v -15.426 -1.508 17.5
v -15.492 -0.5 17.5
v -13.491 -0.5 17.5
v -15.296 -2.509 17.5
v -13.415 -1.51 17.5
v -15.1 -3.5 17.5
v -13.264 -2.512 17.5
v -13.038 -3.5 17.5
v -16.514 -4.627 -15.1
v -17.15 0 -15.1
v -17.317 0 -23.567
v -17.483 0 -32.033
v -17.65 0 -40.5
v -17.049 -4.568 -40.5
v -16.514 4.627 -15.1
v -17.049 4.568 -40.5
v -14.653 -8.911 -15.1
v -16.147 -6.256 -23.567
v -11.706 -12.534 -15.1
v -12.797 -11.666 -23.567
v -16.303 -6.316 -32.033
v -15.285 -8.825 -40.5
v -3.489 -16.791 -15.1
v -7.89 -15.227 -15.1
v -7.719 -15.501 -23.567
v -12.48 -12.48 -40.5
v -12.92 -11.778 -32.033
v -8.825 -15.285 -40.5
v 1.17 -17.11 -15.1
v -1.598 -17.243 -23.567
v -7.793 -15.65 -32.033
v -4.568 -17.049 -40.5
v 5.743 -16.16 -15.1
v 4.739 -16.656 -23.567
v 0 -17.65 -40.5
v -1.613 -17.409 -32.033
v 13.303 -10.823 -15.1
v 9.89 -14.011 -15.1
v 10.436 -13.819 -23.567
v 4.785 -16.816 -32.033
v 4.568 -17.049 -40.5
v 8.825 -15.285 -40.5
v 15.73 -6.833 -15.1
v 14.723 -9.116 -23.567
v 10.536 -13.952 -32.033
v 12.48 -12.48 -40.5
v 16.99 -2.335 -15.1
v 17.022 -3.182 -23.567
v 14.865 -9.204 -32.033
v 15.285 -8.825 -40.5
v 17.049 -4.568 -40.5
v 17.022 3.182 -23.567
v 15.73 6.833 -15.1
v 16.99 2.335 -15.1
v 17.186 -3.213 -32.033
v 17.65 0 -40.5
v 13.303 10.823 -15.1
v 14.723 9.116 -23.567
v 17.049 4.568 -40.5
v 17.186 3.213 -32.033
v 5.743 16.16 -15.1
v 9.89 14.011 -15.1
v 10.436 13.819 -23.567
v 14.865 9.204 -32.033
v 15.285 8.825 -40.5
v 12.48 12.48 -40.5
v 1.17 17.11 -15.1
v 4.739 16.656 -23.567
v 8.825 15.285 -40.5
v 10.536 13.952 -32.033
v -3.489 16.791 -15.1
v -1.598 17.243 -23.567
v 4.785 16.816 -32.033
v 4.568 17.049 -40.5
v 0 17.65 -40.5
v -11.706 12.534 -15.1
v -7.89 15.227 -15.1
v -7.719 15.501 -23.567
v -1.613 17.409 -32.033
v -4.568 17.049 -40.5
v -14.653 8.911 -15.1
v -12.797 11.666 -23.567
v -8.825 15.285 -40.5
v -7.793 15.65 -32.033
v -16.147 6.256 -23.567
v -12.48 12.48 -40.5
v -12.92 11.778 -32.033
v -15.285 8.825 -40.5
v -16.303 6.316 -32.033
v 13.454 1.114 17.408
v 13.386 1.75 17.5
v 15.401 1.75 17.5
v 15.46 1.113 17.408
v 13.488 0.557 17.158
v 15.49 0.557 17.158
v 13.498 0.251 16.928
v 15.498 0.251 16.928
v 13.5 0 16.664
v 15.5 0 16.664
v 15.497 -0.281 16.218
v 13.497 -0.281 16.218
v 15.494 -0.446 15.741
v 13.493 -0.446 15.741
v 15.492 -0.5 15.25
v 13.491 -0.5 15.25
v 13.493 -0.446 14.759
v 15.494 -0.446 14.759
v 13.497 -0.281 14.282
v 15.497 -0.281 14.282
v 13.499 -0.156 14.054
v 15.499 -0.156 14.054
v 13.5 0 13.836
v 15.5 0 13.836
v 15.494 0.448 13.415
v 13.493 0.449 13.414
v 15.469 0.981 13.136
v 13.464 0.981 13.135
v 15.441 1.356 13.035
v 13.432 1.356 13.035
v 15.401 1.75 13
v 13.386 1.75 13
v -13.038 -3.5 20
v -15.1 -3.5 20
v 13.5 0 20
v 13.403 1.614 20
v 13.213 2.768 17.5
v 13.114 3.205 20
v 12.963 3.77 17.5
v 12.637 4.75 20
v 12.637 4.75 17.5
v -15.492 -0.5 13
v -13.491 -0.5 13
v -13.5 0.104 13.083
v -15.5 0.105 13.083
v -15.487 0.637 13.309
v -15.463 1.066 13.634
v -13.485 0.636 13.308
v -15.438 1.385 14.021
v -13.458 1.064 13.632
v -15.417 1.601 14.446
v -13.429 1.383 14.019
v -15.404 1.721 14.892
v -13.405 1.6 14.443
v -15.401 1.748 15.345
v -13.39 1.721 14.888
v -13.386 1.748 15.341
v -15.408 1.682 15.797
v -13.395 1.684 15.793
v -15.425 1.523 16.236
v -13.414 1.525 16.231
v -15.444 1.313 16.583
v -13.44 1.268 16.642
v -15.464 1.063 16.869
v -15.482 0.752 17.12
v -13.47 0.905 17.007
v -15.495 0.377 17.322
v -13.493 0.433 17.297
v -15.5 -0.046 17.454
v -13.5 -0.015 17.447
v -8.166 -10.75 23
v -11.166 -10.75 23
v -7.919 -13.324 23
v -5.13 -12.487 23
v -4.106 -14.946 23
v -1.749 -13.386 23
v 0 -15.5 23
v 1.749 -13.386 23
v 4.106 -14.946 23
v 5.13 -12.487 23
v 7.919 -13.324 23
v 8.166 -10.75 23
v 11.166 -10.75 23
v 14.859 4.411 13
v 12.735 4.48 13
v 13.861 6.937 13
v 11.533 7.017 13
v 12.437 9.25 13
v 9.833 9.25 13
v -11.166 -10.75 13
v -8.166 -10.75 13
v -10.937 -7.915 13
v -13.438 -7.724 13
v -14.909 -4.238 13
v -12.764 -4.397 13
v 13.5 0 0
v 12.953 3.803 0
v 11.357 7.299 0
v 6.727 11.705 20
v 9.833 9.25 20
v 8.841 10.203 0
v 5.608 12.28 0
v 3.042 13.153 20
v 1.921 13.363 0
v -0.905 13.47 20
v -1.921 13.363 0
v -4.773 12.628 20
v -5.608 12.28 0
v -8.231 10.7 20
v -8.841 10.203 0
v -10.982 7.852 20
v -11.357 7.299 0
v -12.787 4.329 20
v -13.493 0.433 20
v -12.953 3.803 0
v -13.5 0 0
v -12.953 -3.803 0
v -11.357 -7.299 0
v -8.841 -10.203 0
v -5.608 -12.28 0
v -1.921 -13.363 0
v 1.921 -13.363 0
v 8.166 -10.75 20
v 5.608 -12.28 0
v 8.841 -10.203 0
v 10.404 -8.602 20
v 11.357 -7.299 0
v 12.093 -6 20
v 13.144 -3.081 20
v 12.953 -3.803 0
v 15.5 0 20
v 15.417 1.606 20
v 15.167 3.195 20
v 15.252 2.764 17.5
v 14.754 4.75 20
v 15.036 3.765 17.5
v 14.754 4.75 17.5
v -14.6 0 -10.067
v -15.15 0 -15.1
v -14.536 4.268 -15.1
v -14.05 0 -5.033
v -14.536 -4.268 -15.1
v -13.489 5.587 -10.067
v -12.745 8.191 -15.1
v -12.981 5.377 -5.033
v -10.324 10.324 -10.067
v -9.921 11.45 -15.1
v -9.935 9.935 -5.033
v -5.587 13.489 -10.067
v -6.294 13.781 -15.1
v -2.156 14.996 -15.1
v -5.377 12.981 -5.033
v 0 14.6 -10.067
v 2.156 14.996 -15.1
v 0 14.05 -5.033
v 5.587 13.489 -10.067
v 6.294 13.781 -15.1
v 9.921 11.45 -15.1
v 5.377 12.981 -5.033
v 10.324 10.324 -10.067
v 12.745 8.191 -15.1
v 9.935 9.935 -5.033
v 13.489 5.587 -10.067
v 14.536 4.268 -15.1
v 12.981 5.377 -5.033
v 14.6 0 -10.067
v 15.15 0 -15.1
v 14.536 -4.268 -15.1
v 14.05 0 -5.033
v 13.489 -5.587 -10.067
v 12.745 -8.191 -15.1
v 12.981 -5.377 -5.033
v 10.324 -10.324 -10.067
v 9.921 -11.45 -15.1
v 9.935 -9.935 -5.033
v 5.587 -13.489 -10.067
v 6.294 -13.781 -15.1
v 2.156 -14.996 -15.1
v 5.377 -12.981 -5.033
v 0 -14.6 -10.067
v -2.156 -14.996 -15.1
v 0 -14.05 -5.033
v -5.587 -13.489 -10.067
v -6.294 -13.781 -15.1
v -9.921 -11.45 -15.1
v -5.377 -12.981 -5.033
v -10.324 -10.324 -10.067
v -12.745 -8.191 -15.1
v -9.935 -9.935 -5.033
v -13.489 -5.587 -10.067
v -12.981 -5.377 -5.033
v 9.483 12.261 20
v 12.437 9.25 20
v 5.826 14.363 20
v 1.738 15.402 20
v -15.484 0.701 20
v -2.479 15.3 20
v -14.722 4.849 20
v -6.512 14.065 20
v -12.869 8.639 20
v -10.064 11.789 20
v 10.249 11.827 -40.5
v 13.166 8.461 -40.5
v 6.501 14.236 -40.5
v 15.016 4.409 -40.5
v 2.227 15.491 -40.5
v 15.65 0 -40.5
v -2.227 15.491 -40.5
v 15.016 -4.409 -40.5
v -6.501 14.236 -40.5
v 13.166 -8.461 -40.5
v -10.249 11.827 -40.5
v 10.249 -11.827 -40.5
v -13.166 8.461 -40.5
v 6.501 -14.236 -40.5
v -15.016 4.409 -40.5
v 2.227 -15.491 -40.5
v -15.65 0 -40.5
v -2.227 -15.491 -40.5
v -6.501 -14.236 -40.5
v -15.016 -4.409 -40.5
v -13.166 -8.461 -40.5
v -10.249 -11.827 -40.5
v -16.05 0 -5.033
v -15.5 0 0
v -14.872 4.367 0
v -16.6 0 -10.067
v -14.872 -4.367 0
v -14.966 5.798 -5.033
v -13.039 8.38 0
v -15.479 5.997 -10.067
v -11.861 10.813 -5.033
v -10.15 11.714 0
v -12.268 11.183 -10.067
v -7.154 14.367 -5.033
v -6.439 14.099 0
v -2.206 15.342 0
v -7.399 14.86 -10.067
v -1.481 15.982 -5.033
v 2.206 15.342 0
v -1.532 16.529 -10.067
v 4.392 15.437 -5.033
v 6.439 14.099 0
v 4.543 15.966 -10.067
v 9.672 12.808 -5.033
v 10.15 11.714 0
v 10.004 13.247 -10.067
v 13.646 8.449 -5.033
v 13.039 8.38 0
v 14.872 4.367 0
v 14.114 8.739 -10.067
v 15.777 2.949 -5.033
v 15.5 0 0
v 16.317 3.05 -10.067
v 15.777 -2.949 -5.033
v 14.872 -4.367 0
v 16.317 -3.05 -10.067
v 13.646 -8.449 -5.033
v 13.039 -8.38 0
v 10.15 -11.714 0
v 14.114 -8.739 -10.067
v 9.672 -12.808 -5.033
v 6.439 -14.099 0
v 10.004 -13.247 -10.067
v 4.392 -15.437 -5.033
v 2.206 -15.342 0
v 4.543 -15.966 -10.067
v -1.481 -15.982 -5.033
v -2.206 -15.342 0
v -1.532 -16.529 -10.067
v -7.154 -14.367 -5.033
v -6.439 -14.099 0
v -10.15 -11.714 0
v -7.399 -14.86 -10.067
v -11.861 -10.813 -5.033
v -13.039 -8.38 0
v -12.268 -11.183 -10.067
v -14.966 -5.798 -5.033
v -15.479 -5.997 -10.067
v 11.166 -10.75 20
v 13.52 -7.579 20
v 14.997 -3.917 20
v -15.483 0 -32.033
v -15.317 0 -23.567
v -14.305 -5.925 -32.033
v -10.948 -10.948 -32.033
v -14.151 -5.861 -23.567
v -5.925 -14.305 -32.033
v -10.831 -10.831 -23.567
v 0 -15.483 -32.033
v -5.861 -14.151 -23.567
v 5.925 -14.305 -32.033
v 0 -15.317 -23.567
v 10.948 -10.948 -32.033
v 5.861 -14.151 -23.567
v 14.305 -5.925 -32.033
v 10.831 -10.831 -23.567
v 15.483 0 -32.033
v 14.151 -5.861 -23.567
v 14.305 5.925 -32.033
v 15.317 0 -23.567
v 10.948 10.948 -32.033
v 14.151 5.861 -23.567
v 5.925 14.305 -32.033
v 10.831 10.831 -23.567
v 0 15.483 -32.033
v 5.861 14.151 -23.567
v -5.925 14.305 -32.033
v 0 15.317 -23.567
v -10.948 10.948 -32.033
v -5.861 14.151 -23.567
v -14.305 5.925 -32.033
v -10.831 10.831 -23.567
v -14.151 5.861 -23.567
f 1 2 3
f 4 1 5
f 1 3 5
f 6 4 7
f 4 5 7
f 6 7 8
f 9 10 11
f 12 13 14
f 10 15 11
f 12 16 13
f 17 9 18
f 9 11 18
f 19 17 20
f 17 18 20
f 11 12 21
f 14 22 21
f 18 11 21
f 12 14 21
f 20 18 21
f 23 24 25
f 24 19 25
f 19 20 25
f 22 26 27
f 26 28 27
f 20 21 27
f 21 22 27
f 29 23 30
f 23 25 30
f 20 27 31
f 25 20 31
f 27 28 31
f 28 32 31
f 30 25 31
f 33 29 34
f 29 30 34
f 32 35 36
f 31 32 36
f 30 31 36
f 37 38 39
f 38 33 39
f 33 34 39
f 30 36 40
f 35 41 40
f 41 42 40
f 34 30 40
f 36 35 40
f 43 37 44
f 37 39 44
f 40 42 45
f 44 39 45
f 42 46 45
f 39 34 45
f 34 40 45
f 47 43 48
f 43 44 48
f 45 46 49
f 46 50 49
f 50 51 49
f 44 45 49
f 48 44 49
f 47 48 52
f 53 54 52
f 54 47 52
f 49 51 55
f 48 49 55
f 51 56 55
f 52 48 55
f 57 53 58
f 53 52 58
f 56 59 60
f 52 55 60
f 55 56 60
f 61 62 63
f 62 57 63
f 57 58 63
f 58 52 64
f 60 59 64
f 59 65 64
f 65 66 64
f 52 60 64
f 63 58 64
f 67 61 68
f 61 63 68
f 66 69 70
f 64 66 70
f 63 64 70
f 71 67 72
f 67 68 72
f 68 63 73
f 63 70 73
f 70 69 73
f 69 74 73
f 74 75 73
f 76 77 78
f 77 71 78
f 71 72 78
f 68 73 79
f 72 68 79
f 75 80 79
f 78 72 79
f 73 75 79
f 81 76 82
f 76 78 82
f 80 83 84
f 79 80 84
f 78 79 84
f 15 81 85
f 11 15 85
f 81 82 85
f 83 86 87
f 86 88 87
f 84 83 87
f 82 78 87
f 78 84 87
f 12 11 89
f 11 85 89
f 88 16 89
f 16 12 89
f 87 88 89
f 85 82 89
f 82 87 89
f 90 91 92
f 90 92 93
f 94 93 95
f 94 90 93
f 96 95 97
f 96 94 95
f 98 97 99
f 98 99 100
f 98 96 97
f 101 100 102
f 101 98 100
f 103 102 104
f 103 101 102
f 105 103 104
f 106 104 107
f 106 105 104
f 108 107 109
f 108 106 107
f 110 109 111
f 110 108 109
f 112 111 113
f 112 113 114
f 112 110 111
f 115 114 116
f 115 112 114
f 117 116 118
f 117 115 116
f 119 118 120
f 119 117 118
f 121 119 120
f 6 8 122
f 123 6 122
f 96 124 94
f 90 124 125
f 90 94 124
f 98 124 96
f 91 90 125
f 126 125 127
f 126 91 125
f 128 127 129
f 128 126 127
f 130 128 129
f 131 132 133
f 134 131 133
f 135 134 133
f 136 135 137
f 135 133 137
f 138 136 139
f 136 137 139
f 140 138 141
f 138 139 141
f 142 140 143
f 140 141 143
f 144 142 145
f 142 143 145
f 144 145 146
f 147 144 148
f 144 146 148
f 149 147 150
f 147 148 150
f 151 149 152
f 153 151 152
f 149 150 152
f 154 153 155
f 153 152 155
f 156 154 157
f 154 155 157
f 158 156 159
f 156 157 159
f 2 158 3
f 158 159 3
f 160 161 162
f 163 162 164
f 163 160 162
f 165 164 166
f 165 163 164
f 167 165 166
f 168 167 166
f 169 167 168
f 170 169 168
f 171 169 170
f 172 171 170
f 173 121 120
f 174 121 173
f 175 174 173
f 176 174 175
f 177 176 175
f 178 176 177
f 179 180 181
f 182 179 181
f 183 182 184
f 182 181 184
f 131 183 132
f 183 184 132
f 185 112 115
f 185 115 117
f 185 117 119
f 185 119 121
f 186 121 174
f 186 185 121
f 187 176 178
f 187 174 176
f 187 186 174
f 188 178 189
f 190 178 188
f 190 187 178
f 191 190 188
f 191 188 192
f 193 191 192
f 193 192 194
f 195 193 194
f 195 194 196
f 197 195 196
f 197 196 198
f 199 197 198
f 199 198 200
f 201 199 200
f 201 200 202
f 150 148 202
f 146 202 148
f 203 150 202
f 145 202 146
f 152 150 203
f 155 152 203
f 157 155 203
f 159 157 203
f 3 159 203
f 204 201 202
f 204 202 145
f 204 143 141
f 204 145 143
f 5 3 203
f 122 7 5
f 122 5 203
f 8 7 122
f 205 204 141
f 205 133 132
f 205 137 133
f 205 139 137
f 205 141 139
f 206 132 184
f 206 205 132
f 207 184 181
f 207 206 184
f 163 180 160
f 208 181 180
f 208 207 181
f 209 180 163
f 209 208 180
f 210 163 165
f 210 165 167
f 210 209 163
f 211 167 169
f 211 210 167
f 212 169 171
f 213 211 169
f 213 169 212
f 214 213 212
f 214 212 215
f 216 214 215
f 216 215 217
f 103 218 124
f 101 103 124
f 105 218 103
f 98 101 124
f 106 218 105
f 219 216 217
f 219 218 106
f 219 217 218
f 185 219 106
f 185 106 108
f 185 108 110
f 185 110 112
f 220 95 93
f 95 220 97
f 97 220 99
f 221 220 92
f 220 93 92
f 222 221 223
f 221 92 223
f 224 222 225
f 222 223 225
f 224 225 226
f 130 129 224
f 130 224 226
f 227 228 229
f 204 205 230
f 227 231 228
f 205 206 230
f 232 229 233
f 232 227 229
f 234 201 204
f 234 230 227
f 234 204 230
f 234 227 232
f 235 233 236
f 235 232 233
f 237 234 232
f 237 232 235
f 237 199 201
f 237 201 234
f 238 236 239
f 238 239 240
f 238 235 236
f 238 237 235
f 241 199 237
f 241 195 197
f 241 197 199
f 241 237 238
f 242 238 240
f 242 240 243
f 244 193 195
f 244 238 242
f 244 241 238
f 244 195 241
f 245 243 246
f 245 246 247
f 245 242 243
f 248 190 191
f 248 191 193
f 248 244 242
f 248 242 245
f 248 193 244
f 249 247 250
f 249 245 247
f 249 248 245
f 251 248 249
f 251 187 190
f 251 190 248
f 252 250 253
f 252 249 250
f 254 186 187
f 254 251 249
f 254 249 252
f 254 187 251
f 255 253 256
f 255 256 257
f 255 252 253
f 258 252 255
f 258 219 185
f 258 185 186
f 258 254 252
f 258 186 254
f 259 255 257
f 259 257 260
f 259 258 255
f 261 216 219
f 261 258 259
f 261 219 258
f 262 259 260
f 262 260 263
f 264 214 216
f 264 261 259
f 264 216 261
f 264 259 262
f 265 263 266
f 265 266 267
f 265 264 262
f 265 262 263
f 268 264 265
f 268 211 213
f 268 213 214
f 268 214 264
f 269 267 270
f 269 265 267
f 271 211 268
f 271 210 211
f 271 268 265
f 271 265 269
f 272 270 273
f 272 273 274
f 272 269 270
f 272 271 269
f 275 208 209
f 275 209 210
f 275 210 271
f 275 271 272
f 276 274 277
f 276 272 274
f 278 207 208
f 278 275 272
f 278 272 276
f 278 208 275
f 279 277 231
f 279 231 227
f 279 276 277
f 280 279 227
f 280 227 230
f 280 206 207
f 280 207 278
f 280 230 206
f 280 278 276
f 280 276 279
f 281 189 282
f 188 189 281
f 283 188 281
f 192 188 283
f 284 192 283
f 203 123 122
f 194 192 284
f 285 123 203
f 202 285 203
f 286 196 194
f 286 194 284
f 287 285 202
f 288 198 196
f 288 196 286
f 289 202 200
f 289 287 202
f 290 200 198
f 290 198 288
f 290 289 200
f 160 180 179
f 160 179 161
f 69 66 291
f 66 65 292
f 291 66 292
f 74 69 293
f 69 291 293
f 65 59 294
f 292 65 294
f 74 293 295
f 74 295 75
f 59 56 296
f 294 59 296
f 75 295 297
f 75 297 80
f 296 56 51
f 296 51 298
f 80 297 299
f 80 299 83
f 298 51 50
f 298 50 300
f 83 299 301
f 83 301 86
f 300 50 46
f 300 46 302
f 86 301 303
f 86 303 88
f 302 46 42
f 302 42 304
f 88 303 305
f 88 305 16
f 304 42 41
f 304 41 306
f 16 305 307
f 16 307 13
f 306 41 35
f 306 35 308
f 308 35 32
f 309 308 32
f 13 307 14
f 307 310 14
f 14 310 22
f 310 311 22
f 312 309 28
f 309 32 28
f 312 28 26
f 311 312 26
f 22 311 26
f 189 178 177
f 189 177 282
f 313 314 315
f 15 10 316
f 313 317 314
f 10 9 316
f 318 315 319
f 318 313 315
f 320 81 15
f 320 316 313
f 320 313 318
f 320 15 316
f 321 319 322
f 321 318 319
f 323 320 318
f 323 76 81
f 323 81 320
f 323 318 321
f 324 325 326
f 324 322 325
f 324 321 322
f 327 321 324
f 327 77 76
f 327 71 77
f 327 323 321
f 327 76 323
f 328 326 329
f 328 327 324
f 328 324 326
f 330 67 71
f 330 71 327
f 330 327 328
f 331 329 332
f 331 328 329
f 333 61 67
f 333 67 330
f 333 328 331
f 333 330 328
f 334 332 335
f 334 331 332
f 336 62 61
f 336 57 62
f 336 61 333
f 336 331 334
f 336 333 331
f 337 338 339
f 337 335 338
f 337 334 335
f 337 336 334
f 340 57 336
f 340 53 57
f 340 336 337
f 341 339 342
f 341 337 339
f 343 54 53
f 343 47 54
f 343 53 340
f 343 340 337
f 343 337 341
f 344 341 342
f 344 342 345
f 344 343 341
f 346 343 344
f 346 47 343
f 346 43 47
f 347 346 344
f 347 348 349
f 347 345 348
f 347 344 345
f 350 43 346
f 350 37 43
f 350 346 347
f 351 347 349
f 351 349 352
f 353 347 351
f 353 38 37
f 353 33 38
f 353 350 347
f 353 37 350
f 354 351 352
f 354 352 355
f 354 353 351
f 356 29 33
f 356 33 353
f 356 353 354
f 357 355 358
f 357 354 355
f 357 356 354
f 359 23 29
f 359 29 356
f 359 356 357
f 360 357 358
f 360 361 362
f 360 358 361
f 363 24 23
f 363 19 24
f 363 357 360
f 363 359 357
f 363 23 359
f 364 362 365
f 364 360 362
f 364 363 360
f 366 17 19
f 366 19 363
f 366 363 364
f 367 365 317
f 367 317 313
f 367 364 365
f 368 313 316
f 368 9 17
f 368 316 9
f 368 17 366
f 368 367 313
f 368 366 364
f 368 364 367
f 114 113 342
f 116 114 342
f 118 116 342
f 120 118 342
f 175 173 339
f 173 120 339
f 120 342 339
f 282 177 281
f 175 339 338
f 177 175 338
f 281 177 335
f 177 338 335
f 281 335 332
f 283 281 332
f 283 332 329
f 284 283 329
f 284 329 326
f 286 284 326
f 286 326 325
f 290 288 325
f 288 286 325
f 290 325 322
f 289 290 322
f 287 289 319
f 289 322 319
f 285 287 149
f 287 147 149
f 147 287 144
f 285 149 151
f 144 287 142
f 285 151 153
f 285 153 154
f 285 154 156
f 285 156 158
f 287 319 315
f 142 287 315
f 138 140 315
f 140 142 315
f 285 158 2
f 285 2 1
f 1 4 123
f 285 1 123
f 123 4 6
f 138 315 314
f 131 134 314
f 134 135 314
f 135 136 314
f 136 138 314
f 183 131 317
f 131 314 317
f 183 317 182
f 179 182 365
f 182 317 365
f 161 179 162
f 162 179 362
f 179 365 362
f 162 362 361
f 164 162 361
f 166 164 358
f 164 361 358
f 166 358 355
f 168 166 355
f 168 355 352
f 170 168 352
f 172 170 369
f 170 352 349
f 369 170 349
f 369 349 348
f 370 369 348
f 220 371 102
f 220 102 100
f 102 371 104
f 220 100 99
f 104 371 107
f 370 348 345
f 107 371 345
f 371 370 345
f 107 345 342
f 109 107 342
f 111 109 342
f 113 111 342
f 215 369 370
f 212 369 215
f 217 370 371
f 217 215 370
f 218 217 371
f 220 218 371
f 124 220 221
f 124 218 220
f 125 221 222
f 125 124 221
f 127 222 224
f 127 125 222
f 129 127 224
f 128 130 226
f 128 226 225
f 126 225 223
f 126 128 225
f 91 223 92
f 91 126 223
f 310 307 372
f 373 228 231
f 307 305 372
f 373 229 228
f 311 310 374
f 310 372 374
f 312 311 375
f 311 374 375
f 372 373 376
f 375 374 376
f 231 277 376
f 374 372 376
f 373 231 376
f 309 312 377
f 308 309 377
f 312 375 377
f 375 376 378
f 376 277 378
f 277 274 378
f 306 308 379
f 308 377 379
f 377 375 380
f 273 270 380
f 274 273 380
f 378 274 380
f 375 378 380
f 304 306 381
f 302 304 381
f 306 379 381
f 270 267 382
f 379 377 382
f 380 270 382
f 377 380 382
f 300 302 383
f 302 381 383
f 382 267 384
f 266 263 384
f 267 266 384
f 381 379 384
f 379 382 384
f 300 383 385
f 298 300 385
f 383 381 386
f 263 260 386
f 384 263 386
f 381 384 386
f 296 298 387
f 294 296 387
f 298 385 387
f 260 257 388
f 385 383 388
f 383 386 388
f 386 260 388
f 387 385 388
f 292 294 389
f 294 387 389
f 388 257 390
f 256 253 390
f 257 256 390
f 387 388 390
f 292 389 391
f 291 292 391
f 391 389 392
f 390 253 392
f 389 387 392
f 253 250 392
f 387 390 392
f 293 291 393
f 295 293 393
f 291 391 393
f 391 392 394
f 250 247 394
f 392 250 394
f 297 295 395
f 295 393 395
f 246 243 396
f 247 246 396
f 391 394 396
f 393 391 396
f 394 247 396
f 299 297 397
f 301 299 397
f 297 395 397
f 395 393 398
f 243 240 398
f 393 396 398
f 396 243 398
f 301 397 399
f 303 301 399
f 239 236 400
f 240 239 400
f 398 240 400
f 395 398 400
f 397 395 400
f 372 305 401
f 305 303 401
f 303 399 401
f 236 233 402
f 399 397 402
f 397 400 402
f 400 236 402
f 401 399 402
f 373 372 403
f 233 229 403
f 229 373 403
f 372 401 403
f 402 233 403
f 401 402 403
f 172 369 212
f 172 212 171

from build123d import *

# Parameters (mm, degrees)
F0_R          = 15.5
F0_R_2        = 13.5
F1_DEPTH      = 23
F2_W          = 26.25
F2_H          = 3
F3_DEPTH      = 62
F3_DEPTH_BACK = 62
F6_REACH      = 29.8275487819
F7_REACH      = 27.5036039842


# Not quite as in the source:
# - an extrude ends at something that could not be found from the text; its depth is read off the source's solid


with BuildPart() as f1:
    # F0 (on Top) → F1 (new body)
    with BuildSketch(Plane.XY):
        Circle(F0_R)
        Circle(F0_R_2, mode=Mode.SUBTRACT)
    extrude(amount=F1_DEPTH)

    # F2 (on Right) → F3 (cut, two sides)
    with BuildSketch(Plane.YZ) as f3_sk:
        with Locations((2.375, 21.5)):
            Rectangle(F2_W, F2_H)
    extrude(amount=-F3_DEPTH, mode=Mode.SUBTRACT)
    extrude(f3_sk.sketch, amount=F3_DEPTH_BACK, mode=Mode.SUBTRACT)

    f6_end = f1.faces().sort_by_distance((-15.5, 0, 11.5))[0]
    # F4 (on Right) → F6 (cut, up to a face of the model that its end follows)
    with BuildSketch(Plane.YZ):
        with BuildLine():
            Line((-3.5, 20), (-10.75, 20))
            Line((-10.75, 20), (-10.75, 13))
            Line((-10.75, 13), (-0.5, 13))
            ThreePointArc((-0.5, 13), (1.75, 15.25), (-0.5, 17.5))
            Line((-0.5, 17.5), (-3.5, 17.5))
            Line((-3.5, 17.5), (-3.5, 20))
        make_face()
    f6_long = extrude(amount=-F6_REACH, mode=Mode.PRIVATE)
    add(split(f6_long, bisect_by=f6_end, keep=Keep.BOTTOM, mode=Mode.PRIVATE), mode=Mode.SUBTRACT)

    f7_end = f1.faces().sort_by_distance((-15.5, 0, 11.5))[0]
    # F5 (on Right) → F7 (cut, up to a face of the model that its end follows)
    with BuildSketch(Plane.YZ):
        with BuildLine():
            Line((4.75, 20), (4.75, 17.5))
            Line((4.75, 17.5), (1.75, 17.5))
            ThreePointArc((1.75, 17.5), (-0.5, 15.25), (1.75, 13))
            Line((1.75, 13), (9.25, 13))
            Line((9.25, 13), (9.25, 20))
            Line((9.25, 20), (4.75, 20))
        make_face()
    f7_long = extrude(amount=F7_REACH, mode=Mode.PRIVATE)
    add(split(f7_long, bisect_by=f7_end, keep=Keep.BOTTOM, mode=Mode.PRIVATE), mode=Mode.SUBTRACT)

    # F10 (on Front) → F11 (revolve)
    with BuildSketch(Plane.XZ):
        Polygon((-15.15, -15.1), (-13.5, 0), (-15.5, 0), (-17.15, -15.1), align=None)
    revolve(axis=Axis((0, 0, -0.5375670735), (0, 0, -1)))

    # F14 (on Front) → F15 (revolve)
    with BuildSketch(Plane.XZ):
        Polygon((-15.15, -15.1), (-17.15, -15.1), (-17.65, -40.5), (-15.65, -40.5), align=None)
    revolve(axis=Axis((0, 0, -27.8), (0, 0, 1)))


solid = f1.part
